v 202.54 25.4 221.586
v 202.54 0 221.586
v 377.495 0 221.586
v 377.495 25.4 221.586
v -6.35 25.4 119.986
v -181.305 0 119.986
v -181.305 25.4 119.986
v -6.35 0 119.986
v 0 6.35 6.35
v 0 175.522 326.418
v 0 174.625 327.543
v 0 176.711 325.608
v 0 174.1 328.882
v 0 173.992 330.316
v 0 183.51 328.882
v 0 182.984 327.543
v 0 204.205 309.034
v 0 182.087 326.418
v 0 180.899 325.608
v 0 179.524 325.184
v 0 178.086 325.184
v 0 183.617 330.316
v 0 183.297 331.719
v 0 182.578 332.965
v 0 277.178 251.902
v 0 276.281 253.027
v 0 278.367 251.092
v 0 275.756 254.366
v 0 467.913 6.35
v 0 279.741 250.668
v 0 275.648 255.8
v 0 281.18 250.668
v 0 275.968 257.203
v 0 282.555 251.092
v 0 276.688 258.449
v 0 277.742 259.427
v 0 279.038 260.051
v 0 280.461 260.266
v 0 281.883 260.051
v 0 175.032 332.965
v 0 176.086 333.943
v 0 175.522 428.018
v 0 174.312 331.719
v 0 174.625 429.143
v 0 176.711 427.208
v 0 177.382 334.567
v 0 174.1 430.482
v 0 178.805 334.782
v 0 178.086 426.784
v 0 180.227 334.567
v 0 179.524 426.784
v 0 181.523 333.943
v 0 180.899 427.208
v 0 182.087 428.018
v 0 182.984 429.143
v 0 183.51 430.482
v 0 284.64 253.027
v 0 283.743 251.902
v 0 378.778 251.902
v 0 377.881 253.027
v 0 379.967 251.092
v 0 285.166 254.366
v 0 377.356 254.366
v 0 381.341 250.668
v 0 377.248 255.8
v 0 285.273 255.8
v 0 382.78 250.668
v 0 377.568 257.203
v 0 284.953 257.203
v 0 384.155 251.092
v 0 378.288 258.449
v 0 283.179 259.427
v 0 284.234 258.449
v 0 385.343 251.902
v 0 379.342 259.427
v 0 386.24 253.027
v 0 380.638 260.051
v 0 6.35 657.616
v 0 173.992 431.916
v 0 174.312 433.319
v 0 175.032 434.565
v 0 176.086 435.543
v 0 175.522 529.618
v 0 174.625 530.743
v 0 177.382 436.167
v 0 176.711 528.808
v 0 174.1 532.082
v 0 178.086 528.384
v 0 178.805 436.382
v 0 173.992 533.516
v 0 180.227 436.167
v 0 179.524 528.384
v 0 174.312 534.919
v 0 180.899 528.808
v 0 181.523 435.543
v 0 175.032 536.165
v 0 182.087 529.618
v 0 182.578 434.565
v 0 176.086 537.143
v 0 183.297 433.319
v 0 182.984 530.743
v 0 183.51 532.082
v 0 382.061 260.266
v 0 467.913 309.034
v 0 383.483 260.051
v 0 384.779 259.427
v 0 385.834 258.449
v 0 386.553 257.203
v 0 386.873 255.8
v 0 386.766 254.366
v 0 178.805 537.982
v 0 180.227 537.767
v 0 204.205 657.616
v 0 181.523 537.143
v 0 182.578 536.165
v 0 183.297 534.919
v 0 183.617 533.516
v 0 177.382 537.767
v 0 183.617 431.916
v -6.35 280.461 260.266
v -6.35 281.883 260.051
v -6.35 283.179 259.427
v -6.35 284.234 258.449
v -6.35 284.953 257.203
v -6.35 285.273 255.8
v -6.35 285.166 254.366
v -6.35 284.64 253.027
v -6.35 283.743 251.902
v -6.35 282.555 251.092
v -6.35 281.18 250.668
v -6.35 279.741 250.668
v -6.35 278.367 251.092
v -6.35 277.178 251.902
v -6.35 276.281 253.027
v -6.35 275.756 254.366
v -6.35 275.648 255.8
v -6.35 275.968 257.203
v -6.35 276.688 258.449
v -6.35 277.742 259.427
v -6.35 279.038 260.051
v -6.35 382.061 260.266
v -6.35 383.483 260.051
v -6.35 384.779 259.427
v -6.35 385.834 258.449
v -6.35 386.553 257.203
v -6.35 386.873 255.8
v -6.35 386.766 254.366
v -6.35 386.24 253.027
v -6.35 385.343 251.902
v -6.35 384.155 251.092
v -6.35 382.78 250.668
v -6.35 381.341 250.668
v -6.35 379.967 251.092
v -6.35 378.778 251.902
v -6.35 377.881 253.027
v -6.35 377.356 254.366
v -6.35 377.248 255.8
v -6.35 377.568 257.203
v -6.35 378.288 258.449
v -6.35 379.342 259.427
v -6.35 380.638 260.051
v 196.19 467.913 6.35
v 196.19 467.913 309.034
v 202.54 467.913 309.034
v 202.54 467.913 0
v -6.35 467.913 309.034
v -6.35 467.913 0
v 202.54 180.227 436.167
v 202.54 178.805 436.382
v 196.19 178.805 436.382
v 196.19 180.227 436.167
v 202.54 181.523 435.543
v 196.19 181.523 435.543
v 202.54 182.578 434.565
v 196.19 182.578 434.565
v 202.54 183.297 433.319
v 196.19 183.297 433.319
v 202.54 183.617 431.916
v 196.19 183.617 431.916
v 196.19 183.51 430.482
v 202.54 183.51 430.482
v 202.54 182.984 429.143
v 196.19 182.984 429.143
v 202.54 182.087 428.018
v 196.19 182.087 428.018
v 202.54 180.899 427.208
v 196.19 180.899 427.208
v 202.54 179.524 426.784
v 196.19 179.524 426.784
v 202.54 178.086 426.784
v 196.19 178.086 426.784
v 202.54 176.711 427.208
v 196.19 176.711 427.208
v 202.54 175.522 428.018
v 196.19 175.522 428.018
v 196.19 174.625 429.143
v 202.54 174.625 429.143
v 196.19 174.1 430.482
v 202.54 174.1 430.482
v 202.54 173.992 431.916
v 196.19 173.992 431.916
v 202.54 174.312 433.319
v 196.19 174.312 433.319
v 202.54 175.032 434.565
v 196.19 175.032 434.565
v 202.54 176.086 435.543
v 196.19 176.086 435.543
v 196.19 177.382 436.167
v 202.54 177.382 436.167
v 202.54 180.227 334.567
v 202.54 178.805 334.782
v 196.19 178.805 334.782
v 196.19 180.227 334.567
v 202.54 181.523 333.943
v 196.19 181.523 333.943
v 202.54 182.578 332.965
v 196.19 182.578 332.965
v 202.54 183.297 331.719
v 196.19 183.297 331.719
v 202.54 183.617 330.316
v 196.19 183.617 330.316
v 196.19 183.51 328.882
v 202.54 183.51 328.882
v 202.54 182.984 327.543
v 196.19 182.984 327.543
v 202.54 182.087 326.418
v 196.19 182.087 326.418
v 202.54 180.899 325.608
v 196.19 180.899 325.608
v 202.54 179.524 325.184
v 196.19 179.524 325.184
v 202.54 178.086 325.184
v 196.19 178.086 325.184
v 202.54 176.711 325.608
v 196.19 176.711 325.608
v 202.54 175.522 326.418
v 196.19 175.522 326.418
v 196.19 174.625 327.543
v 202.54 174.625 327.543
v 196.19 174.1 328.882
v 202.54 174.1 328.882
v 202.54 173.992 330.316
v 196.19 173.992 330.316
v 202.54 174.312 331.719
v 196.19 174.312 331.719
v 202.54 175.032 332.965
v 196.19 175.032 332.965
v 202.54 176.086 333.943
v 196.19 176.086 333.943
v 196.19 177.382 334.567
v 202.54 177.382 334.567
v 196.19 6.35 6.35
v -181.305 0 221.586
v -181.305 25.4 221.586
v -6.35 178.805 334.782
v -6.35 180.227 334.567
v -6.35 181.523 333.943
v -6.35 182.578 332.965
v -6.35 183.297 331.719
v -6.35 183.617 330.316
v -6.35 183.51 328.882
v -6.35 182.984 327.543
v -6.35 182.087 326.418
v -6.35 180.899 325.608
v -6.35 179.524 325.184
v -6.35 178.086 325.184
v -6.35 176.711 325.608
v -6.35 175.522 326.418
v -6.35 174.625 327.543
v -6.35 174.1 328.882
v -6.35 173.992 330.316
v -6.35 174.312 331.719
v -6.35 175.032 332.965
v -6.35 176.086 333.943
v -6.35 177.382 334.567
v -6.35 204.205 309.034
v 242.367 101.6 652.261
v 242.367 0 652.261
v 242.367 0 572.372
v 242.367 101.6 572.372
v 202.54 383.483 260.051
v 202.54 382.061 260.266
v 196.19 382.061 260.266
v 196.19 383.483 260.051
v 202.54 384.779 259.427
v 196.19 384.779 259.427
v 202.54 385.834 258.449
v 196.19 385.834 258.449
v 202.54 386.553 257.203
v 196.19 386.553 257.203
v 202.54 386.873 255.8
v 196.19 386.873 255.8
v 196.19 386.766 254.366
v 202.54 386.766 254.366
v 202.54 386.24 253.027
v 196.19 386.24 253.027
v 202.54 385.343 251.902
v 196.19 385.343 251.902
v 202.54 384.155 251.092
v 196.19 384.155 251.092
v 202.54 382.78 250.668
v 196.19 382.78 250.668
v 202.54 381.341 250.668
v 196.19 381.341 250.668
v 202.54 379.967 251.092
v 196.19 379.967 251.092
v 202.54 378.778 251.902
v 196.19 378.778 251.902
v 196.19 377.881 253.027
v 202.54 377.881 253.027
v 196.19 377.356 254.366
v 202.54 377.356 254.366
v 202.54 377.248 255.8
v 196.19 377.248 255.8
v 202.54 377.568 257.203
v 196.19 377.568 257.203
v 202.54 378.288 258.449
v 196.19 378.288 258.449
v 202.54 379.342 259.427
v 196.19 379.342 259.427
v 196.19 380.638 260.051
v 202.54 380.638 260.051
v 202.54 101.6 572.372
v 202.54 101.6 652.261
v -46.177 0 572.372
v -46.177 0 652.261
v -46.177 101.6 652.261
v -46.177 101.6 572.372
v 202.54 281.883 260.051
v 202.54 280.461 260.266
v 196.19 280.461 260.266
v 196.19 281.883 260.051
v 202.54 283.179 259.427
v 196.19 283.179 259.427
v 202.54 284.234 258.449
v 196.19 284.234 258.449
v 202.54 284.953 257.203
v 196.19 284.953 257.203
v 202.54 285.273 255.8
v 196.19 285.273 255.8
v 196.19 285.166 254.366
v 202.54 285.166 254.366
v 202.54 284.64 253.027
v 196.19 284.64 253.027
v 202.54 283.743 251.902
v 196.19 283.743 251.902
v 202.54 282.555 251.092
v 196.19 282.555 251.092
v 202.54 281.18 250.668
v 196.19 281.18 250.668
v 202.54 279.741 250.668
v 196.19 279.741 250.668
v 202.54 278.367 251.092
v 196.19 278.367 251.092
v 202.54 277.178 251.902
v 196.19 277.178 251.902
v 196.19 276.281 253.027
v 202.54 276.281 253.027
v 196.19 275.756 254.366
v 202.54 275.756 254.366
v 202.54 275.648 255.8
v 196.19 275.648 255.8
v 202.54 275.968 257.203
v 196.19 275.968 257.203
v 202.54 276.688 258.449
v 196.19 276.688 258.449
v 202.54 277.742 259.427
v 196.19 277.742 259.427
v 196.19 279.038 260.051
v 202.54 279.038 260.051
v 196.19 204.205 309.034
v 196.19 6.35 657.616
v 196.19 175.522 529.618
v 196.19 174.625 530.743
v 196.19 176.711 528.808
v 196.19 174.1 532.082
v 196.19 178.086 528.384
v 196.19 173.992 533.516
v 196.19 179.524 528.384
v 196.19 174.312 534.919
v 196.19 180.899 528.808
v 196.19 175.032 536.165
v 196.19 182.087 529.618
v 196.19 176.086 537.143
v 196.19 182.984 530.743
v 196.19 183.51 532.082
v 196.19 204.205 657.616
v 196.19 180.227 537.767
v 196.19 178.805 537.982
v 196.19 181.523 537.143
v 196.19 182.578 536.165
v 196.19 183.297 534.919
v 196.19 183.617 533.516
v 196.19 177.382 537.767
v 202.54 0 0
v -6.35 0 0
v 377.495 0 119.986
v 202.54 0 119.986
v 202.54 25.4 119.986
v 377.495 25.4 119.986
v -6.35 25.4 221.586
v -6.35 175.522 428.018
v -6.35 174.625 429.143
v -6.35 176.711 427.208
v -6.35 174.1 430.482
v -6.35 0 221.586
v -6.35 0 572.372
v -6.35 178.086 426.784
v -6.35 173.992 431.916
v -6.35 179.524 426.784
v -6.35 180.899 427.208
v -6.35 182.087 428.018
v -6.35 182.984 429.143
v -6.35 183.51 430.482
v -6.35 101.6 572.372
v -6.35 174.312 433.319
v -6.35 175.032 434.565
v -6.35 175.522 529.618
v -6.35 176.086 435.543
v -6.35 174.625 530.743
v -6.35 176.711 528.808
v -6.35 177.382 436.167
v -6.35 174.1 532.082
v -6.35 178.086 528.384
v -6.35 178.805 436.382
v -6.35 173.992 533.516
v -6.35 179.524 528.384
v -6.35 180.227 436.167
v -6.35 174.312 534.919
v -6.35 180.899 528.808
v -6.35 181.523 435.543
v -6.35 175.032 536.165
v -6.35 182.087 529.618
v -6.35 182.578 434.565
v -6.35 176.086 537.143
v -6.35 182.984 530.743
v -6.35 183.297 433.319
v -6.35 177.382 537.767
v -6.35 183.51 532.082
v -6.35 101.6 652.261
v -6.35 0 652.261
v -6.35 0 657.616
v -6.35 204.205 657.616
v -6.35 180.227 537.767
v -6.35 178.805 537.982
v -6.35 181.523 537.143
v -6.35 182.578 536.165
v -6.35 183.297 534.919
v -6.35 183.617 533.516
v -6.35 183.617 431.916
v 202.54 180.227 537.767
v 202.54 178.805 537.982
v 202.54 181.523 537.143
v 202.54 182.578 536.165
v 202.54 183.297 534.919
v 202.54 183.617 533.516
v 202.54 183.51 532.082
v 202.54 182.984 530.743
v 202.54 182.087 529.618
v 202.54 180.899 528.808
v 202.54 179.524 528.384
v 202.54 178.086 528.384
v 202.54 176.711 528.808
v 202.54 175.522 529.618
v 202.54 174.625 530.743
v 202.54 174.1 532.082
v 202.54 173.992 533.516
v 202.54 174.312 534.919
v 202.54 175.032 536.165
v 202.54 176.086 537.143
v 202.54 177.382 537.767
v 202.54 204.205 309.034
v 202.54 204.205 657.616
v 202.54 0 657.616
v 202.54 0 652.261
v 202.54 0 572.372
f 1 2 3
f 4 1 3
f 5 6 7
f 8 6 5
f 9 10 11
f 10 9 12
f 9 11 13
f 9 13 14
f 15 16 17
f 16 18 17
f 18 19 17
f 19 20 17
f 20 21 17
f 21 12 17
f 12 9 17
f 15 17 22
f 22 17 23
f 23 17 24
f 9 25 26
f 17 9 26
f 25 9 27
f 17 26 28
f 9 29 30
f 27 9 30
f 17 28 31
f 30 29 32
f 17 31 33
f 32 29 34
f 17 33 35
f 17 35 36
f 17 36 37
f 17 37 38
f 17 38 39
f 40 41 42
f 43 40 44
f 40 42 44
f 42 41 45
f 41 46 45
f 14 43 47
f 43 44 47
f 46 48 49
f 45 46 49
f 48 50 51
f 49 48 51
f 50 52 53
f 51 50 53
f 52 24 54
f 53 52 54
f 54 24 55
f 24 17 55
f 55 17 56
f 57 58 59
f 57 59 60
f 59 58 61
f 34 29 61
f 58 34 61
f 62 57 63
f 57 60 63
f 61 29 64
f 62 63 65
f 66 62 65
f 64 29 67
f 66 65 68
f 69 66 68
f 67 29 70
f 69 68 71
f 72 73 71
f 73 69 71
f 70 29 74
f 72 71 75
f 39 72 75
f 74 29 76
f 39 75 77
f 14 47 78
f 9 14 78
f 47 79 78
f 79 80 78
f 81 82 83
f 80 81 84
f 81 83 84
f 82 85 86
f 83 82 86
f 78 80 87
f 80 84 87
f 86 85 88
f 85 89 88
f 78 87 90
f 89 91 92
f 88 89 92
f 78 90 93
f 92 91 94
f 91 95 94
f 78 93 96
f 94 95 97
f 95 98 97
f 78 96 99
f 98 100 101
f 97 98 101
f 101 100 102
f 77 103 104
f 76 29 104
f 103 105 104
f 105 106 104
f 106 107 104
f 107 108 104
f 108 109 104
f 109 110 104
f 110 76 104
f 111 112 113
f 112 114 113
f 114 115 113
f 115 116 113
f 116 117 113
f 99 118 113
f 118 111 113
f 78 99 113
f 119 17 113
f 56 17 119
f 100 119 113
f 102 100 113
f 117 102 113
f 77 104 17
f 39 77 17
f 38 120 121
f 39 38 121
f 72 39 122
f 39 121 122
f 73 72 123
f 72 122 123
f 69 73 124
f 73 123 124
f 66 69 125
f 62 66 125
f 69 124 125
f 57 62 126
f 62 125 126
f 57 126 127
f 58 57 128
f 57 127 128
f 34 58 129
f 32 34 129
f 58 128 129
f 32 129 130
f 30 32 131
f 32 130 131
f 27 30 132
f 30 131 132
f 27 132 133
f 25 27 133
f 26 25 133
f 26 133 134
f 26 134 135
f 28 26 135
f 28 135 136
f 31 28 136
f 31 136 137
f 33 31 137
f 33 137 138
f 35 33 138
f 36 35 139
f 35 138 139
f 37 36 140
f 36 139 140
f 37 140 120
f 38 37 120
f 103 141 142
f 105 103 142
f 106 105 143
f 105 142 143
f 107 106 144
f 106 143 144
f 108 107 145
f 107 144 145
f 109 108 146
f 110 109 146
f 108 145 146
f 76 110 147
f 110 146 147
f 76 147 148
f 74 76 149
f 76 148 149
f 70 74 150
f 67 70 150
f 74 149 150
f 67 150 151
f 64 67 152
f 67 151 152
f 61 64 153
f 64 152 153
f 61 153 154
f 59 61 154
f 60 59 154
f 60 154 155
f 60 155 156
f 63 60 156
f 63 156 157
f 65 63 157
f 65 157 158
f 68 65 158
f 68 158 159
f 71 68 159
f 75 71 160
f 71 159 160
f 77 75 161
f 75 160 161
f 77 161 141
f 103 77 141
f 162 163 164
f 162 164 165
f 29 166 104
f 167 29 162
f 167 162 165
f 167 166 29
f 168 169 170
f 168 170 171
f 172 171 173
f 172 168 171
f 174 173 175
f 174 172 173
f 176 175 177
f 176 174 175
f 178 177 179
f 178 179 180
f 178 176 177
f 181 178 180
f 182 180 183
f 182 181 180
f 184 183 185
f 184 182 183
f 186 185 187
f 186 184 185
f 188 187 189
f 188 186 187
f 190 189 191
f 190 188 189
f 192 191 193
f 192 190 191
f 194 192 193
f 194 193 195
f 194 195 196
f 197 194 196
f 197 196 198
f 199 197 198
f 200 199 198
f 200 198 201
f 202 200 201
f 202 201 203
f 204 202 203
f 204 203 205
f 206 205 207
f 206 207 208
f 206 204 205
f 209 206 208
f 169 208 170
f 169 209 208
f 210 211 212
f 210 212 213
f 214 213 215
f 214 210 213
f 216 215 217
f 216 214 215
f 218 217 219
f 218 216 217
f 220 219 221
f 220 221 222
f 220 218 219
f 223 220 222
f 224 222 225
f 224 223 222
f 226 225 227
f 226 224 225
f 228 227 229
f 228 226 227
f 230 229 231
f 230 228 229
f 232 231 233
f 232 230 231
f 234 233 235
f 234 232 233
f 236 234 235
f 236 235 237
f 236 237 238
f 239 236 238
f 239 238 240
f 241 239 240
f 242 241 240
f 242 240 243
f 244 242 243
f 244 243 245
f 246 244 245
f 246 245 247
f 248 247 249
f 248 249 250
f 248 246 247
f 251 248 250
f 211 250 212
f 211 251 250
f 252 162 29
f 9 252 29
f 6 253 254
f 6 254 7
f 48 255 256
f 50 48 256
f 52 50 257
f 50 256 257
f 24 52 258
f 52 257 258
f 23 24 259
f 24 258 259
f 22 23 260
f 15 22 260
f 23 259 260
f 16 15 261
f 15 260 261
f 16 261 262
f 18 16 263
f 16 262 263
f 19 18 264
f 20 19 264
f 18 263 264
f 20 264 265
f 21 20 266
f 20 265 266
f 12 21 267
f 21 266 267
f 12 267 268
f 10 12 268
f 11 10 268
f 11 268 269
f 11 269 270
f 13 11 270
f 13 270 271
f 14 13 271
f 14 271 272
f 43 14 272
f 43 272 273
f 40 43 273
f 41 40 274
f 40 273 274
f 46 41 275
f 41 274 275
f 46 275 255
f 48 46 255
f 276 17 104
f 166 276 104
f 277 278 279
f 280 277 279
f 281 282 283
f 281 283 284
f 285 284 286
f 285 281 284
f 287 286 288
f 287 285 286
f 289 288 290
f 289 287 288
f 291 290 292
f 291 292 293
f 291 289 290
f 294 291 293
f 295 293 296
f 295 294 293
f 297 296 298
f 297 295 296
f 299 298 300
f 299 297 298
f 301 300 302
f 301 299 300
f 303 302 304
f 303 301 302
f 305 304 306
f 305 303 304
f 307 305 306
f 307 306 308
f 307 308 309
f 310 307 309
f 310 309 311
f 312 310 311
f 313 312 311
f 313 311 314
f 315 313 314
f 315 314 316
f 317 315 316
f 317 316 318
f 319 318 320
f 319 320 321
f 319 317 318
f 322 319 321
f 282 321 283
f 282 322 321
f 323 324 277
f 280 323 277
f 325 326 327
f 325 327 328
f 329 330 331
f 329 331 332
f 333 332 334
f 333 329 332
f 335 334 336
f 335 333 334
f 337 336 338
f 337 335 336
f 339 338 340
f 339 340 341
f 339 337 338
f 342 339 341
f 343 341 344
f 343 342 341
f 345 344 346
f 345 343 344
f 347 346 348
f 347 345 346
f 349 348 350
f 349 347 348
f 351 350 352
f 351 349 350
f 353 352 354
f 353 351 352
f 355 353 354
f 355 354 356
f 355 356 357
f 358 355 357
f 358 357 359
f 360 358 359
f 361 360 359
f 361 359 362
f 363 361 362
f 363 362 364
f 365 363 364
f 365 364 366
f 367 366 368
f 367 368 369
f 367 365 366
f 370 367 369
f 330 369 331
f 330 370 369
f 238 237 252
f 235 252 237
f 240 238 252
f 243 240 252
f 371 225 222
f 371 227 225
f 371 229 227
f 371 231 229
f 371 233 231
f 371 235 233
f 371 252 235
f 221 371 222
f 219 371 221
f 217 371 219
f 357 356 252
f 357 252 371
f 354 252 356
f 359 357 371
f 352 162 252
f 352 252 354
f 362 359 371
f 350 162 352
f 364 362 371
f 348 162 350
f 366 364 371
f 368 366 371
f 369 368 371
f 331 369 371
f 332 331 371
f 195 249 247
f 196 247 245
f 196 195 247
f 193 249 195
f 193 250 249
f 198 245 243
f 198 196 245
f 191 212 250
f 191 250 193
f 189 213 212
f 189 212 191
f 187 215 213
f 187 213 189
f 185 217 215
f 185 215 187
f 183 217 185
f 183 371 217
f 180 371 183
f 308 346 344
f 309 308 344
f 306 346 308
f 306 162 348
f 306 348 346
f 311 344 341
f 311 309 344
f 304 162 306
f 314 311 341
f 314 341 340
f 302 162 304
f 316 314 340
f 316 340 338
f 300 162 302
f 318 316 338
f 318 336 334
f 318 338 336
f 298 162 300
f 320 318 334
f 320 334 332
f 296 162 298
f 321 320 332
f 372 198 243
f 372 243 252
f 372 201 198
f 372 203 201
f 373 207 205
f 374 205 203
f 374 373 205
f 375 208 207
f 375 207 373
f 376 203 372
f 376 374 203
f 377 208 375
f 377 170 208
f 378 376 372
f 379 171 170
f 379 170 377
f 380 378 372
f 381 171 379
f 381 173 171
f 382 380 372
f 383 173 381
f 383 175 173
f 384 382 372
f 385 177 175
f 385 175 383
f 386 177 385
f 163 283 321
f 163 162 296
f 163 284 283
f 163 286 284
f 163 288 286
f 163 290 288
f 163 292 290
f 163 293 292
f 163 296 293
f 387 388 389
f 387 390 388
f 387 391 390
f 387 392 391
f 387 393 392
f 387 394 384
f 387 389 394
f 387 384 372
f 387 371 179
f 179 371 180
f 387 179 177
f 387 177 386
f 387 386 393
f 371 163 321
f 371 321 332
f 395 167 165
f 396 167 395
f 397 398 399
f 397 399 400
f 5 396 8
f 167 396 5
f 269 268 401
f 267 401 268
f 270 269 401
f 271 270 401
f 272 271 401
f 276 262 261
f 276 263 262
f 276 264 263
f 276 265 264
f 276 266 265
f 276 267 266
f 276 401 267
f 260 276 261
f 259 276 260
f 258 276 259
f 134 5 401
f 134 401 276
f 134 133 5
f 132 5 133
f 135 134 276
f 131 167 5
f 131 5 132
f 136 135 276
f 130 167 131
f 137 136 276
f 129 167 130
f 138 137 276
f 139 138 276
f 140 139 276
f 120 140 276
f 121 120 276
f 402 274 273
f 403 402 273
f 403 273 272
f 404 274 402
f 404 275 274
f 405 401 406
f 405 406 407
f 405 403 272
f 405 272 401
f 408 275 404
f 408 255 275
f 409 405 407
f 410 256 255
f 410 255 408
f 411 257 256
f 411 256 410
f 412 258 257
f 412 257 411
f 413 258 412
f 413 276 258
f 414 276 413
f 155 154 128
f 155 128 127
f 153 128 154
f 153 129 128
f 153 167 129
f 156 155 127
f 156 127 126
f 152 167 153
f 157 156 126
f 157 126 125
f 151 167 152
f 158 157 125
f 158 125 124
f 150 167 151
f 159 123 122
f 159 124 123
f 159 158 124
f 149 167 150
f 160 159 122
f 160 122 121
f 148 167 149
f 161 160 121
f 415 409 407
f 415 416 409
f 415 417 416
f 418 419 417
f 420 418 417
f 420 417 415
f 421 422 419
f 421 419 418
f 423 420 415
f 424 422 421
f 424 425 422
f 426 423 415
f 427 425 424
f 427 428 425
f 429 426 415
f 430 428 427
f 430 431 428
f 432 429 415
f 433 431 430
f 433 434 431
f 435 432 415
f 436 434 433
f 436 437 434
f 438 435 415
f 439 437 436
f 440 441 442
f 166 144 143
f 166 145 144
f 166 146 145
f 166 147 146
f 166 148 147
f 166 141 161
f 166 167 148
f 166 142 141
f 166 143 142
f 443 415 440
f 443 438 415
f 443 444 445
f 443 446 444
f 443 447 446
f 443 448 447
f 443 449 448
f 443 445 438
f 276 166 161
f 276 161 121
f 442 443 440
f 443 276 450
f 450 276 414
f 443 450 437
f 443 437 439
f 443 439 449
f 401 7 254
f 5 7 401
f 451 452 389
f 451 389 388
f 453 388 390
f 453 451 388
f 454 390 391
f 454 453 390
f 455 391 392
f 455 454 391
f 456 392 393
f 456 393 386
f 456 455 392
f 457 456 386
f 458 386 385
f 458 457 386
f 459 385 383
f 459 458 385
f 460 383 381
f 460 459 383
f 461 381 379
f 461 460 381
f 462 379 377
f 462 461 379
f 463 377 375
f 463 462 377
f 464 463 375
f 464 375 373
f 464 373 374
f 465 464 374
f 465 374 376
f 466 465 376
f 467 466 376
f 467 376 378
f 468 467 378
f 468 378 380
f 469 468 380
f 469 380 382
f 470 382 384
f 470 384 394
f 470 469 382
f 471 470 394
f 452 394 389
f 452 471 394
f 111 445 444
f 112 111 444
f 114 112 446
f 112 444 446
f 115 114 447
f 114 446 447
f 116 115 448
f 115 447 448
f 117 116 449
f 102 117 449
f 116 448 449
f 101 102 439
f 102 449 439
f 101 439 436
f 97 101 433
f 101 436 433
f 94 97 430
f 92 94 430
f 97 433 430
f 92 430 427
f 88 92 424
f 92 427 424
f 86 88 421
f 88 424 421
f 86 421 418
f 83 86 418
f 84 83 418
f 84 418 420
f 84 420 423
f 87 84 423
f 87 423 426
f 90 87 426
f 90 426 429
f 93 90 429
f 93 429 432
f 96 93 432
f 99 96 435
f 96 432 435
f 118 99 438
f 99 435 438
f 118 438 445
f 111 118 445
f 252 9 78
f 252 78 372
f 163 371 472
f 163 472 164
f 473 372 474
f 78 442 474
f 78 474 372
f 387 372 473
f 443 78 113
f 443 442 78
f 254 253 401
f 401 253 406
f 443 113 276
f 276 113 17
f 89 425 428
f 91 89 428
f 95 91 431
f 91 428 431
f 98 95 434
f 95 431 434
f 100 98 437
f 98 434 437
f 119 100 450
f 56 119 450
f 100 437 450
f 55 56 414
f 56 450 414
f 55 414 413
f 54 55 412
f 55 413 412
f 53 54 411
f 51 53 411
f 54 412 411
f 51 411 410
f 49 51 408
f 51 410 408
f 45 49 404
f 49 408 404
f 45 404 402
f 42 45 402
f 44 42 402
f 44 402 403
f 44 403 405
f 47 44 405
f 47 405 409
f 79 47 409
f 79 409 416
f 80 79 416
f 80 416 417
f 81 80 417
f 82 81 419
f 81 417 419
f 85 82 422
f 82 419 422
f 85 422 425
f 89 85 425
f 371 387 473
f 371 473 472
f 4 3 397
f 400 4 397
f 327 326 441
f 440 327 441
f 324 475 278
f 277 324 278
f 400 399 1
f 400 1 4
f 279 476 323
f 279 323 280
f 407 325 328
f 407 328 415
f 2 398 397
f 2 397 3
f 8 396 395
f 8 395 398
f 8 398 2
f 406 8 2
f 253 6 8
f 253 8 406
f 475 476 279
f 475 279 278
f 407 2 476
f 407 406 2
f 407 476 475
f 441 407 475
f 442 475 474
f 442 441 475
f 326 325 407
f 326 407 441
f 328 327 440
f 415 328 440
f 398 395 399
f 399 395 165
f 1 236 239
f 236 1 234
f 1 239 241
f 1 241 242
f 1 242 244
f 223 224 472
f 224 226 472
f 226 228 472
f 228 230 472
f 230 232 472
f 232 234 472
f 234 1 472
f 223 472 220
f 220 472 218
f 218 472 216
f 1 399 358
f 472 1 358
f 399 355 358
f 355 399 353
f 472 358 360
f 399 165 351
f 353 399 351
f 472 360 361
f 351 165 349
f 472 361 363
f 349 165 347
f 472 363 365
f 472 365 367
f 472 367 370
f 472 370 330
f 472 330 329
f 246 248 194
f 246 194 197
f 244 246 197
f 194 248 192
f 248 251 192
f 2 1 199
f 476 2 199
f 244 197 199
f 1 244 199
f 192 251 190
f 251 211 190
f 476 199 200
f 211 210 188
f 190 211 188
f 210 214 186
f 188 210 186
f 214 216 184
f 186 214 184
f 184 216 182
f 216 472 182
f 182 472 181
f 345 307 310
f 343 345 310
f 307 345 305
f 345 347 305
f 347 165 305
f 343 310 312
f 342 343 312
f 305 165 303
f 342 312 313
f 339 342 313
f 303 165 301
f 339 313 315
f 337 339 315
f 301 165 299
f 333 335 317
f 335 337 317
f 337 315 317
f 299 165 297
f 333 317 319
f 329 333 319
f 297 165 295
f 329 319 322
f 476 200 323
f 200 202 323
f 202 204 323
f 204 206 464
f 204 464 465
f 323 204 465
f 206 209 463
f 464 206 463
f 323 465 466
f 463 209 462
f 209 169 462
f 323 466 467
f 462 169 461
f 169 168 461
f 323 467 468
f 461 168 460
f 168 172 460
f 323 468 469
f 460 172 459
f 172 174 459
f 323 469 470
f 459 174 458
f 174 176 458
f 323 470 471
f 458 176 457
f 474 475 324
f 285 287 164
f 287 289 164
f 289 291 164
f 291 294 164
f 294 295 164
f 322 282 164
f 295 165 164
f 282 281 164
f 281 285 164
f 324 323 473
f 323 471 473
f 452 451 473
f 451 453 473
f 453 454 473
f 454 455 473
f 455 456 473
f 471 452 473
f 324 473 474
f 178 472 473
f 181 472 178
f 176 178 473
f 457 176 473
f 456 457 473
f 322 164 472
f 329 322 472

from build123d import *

# Parameters (mm, degrees)
BOSS_EXTRUDE1_DEPTH = 6.35
SKETCH17_W          = 196.1896
SKETCH17_H          = 657.6157706
BOSS_EXTRUDE2_DEPTH = 6.35
SKETCH18_W          = 208.8896
SKETCH18_H          = 467.912654328
BOSS_EXTRUDE3_DEPTH = 6.35
SKETCH20_W          = 174.9552
SKETCH20_H          = 101.6
BOSS_EXTRUDE4_DEPTH = 25.4
SKETCH22_W          = 39.8272
SKETCH22_H          = 79.88897833
BOSS_EXTRUDE5_DEPTH = 101.6
SKETCH25_R          = 4.826
CUT_EXTRUDE1_DEPTH  = 6.35


with BuildPart() as part:
    # Sketch15 → Boss-Extrude1 (new body)
    with BuildSketch(Plane(origin=(0, 0, 0), x_dir=(0, 0, -1), z_dir=(1, 0, 0))):
        Polygon((0, 0), (-657.6157706, 0), (-657.6157706, 204.204861602), (-309.033798252, 204.204861602), (-309.033798252, 467.912654328), (0, 467.912654328), align=None)
    boss_extrude1 = extrude(amount=-BOSS_EXTRUDE1_DEPTH)

    # Sketch17 → Boss-Extrude2 (add)
    with BuildSketch(Plane(origin=(0, 0, 0), x_dir=(1, 0, 0), z_dir=(0, 1, 0))):
        with Locations((98.0948, -328.8078853)):
            Rectangle(SKETCH17_W, SKETCH17_H)
    extrude(amount=BOSS_EXTRUDE2_DEPTH)

    # Mirror1: Boss-Extrude1 across plane
    add(boss_extrude1.mirror(Plane(origin=(98.0948, 0, 0), x_dir=(0, 0, 1), z_dir=(1, 0, 0))))

    # Sketch18 → Boss-Extrude3 (add)
    with BuildSketch(Plane(origin=(0, 0, 0), x_dir=(-1, 0, 0), z_dir=(0, 0, -1))):
        with Locations((-98.0948, 233.956327164)):
            Rectangle(SKETCH18_W, SKETCH18_H)
    extrude(amount=-BOSS_EXTRUDE3_DEPTH)

    # Sketch20 → Boss-Extrude4 (add)
    with BuildSketch(Plane(origin=(0, 0, 0), x_dir=(1, 0, 0), z_dir=(0, 1, 0))):
        with Locations((-93.8276, -170.785936787)):
            Rectangle(SKETCH20_W, SKETCH20_H)
        with Locations((290.0172, -170.785936787)):
            Rectangle(SKETCH20_W, SKETCH20_H)
    extrude(amount=BOSS_EXTRUDE4_DEPTH)

    # Sketch22 → Boss-Extrude5 (add)
    with BuildSketch(Plane(origin=(0, 0, 0), x_dir=(1, 0, 0), z_dir=(0, 1, 0))):
        with Locations((-26.2636, -612.31684817)):
            Rectangle(SKETCH22_W, SKETCH22_H)
        with Locations((222.4532, -612.31684817)):
            Rectangle(SKETCH22_W, SKETCH22_H)
    extrude(amount=BOSS_EXTRUDE5_DEPTH)

    # Sketch25 → Cut-Extrude1 (cut)
    with BuildSketch(Plane.ZY.offset(6.35)):
        with Locations((533.1557706, 178.804861602)):
            Circle(SKETCH25_R)
        with Locations((431.5557706, 178.804861602)):
            Circle(SKETCH25_R)
        with Locations((329.9557706, 178.804861602)):
            Circle(SKETCH25_R)
        with Locations((255.439798252, 280.460654328)):
            Circle(SKETCH25_R)
        with Locations((255.439798252, 382.060654328)):
            Circle(SKETCH25_R)
    cut_extrude1 = extrude(amount=-CUT_EXTRUDE1_DEPTH, mode=Mode.SUBTRACT)

    # Mirror2: Cut-Extrude1 across plane
    add(cut_extrude1.mirror(Plane(origin=(98.0948, 0, 0), x_dir=(0, 0, 1), z_dir=(1, 0, 0))), mode=Mode.SUBTRACT)


solid = part.part
